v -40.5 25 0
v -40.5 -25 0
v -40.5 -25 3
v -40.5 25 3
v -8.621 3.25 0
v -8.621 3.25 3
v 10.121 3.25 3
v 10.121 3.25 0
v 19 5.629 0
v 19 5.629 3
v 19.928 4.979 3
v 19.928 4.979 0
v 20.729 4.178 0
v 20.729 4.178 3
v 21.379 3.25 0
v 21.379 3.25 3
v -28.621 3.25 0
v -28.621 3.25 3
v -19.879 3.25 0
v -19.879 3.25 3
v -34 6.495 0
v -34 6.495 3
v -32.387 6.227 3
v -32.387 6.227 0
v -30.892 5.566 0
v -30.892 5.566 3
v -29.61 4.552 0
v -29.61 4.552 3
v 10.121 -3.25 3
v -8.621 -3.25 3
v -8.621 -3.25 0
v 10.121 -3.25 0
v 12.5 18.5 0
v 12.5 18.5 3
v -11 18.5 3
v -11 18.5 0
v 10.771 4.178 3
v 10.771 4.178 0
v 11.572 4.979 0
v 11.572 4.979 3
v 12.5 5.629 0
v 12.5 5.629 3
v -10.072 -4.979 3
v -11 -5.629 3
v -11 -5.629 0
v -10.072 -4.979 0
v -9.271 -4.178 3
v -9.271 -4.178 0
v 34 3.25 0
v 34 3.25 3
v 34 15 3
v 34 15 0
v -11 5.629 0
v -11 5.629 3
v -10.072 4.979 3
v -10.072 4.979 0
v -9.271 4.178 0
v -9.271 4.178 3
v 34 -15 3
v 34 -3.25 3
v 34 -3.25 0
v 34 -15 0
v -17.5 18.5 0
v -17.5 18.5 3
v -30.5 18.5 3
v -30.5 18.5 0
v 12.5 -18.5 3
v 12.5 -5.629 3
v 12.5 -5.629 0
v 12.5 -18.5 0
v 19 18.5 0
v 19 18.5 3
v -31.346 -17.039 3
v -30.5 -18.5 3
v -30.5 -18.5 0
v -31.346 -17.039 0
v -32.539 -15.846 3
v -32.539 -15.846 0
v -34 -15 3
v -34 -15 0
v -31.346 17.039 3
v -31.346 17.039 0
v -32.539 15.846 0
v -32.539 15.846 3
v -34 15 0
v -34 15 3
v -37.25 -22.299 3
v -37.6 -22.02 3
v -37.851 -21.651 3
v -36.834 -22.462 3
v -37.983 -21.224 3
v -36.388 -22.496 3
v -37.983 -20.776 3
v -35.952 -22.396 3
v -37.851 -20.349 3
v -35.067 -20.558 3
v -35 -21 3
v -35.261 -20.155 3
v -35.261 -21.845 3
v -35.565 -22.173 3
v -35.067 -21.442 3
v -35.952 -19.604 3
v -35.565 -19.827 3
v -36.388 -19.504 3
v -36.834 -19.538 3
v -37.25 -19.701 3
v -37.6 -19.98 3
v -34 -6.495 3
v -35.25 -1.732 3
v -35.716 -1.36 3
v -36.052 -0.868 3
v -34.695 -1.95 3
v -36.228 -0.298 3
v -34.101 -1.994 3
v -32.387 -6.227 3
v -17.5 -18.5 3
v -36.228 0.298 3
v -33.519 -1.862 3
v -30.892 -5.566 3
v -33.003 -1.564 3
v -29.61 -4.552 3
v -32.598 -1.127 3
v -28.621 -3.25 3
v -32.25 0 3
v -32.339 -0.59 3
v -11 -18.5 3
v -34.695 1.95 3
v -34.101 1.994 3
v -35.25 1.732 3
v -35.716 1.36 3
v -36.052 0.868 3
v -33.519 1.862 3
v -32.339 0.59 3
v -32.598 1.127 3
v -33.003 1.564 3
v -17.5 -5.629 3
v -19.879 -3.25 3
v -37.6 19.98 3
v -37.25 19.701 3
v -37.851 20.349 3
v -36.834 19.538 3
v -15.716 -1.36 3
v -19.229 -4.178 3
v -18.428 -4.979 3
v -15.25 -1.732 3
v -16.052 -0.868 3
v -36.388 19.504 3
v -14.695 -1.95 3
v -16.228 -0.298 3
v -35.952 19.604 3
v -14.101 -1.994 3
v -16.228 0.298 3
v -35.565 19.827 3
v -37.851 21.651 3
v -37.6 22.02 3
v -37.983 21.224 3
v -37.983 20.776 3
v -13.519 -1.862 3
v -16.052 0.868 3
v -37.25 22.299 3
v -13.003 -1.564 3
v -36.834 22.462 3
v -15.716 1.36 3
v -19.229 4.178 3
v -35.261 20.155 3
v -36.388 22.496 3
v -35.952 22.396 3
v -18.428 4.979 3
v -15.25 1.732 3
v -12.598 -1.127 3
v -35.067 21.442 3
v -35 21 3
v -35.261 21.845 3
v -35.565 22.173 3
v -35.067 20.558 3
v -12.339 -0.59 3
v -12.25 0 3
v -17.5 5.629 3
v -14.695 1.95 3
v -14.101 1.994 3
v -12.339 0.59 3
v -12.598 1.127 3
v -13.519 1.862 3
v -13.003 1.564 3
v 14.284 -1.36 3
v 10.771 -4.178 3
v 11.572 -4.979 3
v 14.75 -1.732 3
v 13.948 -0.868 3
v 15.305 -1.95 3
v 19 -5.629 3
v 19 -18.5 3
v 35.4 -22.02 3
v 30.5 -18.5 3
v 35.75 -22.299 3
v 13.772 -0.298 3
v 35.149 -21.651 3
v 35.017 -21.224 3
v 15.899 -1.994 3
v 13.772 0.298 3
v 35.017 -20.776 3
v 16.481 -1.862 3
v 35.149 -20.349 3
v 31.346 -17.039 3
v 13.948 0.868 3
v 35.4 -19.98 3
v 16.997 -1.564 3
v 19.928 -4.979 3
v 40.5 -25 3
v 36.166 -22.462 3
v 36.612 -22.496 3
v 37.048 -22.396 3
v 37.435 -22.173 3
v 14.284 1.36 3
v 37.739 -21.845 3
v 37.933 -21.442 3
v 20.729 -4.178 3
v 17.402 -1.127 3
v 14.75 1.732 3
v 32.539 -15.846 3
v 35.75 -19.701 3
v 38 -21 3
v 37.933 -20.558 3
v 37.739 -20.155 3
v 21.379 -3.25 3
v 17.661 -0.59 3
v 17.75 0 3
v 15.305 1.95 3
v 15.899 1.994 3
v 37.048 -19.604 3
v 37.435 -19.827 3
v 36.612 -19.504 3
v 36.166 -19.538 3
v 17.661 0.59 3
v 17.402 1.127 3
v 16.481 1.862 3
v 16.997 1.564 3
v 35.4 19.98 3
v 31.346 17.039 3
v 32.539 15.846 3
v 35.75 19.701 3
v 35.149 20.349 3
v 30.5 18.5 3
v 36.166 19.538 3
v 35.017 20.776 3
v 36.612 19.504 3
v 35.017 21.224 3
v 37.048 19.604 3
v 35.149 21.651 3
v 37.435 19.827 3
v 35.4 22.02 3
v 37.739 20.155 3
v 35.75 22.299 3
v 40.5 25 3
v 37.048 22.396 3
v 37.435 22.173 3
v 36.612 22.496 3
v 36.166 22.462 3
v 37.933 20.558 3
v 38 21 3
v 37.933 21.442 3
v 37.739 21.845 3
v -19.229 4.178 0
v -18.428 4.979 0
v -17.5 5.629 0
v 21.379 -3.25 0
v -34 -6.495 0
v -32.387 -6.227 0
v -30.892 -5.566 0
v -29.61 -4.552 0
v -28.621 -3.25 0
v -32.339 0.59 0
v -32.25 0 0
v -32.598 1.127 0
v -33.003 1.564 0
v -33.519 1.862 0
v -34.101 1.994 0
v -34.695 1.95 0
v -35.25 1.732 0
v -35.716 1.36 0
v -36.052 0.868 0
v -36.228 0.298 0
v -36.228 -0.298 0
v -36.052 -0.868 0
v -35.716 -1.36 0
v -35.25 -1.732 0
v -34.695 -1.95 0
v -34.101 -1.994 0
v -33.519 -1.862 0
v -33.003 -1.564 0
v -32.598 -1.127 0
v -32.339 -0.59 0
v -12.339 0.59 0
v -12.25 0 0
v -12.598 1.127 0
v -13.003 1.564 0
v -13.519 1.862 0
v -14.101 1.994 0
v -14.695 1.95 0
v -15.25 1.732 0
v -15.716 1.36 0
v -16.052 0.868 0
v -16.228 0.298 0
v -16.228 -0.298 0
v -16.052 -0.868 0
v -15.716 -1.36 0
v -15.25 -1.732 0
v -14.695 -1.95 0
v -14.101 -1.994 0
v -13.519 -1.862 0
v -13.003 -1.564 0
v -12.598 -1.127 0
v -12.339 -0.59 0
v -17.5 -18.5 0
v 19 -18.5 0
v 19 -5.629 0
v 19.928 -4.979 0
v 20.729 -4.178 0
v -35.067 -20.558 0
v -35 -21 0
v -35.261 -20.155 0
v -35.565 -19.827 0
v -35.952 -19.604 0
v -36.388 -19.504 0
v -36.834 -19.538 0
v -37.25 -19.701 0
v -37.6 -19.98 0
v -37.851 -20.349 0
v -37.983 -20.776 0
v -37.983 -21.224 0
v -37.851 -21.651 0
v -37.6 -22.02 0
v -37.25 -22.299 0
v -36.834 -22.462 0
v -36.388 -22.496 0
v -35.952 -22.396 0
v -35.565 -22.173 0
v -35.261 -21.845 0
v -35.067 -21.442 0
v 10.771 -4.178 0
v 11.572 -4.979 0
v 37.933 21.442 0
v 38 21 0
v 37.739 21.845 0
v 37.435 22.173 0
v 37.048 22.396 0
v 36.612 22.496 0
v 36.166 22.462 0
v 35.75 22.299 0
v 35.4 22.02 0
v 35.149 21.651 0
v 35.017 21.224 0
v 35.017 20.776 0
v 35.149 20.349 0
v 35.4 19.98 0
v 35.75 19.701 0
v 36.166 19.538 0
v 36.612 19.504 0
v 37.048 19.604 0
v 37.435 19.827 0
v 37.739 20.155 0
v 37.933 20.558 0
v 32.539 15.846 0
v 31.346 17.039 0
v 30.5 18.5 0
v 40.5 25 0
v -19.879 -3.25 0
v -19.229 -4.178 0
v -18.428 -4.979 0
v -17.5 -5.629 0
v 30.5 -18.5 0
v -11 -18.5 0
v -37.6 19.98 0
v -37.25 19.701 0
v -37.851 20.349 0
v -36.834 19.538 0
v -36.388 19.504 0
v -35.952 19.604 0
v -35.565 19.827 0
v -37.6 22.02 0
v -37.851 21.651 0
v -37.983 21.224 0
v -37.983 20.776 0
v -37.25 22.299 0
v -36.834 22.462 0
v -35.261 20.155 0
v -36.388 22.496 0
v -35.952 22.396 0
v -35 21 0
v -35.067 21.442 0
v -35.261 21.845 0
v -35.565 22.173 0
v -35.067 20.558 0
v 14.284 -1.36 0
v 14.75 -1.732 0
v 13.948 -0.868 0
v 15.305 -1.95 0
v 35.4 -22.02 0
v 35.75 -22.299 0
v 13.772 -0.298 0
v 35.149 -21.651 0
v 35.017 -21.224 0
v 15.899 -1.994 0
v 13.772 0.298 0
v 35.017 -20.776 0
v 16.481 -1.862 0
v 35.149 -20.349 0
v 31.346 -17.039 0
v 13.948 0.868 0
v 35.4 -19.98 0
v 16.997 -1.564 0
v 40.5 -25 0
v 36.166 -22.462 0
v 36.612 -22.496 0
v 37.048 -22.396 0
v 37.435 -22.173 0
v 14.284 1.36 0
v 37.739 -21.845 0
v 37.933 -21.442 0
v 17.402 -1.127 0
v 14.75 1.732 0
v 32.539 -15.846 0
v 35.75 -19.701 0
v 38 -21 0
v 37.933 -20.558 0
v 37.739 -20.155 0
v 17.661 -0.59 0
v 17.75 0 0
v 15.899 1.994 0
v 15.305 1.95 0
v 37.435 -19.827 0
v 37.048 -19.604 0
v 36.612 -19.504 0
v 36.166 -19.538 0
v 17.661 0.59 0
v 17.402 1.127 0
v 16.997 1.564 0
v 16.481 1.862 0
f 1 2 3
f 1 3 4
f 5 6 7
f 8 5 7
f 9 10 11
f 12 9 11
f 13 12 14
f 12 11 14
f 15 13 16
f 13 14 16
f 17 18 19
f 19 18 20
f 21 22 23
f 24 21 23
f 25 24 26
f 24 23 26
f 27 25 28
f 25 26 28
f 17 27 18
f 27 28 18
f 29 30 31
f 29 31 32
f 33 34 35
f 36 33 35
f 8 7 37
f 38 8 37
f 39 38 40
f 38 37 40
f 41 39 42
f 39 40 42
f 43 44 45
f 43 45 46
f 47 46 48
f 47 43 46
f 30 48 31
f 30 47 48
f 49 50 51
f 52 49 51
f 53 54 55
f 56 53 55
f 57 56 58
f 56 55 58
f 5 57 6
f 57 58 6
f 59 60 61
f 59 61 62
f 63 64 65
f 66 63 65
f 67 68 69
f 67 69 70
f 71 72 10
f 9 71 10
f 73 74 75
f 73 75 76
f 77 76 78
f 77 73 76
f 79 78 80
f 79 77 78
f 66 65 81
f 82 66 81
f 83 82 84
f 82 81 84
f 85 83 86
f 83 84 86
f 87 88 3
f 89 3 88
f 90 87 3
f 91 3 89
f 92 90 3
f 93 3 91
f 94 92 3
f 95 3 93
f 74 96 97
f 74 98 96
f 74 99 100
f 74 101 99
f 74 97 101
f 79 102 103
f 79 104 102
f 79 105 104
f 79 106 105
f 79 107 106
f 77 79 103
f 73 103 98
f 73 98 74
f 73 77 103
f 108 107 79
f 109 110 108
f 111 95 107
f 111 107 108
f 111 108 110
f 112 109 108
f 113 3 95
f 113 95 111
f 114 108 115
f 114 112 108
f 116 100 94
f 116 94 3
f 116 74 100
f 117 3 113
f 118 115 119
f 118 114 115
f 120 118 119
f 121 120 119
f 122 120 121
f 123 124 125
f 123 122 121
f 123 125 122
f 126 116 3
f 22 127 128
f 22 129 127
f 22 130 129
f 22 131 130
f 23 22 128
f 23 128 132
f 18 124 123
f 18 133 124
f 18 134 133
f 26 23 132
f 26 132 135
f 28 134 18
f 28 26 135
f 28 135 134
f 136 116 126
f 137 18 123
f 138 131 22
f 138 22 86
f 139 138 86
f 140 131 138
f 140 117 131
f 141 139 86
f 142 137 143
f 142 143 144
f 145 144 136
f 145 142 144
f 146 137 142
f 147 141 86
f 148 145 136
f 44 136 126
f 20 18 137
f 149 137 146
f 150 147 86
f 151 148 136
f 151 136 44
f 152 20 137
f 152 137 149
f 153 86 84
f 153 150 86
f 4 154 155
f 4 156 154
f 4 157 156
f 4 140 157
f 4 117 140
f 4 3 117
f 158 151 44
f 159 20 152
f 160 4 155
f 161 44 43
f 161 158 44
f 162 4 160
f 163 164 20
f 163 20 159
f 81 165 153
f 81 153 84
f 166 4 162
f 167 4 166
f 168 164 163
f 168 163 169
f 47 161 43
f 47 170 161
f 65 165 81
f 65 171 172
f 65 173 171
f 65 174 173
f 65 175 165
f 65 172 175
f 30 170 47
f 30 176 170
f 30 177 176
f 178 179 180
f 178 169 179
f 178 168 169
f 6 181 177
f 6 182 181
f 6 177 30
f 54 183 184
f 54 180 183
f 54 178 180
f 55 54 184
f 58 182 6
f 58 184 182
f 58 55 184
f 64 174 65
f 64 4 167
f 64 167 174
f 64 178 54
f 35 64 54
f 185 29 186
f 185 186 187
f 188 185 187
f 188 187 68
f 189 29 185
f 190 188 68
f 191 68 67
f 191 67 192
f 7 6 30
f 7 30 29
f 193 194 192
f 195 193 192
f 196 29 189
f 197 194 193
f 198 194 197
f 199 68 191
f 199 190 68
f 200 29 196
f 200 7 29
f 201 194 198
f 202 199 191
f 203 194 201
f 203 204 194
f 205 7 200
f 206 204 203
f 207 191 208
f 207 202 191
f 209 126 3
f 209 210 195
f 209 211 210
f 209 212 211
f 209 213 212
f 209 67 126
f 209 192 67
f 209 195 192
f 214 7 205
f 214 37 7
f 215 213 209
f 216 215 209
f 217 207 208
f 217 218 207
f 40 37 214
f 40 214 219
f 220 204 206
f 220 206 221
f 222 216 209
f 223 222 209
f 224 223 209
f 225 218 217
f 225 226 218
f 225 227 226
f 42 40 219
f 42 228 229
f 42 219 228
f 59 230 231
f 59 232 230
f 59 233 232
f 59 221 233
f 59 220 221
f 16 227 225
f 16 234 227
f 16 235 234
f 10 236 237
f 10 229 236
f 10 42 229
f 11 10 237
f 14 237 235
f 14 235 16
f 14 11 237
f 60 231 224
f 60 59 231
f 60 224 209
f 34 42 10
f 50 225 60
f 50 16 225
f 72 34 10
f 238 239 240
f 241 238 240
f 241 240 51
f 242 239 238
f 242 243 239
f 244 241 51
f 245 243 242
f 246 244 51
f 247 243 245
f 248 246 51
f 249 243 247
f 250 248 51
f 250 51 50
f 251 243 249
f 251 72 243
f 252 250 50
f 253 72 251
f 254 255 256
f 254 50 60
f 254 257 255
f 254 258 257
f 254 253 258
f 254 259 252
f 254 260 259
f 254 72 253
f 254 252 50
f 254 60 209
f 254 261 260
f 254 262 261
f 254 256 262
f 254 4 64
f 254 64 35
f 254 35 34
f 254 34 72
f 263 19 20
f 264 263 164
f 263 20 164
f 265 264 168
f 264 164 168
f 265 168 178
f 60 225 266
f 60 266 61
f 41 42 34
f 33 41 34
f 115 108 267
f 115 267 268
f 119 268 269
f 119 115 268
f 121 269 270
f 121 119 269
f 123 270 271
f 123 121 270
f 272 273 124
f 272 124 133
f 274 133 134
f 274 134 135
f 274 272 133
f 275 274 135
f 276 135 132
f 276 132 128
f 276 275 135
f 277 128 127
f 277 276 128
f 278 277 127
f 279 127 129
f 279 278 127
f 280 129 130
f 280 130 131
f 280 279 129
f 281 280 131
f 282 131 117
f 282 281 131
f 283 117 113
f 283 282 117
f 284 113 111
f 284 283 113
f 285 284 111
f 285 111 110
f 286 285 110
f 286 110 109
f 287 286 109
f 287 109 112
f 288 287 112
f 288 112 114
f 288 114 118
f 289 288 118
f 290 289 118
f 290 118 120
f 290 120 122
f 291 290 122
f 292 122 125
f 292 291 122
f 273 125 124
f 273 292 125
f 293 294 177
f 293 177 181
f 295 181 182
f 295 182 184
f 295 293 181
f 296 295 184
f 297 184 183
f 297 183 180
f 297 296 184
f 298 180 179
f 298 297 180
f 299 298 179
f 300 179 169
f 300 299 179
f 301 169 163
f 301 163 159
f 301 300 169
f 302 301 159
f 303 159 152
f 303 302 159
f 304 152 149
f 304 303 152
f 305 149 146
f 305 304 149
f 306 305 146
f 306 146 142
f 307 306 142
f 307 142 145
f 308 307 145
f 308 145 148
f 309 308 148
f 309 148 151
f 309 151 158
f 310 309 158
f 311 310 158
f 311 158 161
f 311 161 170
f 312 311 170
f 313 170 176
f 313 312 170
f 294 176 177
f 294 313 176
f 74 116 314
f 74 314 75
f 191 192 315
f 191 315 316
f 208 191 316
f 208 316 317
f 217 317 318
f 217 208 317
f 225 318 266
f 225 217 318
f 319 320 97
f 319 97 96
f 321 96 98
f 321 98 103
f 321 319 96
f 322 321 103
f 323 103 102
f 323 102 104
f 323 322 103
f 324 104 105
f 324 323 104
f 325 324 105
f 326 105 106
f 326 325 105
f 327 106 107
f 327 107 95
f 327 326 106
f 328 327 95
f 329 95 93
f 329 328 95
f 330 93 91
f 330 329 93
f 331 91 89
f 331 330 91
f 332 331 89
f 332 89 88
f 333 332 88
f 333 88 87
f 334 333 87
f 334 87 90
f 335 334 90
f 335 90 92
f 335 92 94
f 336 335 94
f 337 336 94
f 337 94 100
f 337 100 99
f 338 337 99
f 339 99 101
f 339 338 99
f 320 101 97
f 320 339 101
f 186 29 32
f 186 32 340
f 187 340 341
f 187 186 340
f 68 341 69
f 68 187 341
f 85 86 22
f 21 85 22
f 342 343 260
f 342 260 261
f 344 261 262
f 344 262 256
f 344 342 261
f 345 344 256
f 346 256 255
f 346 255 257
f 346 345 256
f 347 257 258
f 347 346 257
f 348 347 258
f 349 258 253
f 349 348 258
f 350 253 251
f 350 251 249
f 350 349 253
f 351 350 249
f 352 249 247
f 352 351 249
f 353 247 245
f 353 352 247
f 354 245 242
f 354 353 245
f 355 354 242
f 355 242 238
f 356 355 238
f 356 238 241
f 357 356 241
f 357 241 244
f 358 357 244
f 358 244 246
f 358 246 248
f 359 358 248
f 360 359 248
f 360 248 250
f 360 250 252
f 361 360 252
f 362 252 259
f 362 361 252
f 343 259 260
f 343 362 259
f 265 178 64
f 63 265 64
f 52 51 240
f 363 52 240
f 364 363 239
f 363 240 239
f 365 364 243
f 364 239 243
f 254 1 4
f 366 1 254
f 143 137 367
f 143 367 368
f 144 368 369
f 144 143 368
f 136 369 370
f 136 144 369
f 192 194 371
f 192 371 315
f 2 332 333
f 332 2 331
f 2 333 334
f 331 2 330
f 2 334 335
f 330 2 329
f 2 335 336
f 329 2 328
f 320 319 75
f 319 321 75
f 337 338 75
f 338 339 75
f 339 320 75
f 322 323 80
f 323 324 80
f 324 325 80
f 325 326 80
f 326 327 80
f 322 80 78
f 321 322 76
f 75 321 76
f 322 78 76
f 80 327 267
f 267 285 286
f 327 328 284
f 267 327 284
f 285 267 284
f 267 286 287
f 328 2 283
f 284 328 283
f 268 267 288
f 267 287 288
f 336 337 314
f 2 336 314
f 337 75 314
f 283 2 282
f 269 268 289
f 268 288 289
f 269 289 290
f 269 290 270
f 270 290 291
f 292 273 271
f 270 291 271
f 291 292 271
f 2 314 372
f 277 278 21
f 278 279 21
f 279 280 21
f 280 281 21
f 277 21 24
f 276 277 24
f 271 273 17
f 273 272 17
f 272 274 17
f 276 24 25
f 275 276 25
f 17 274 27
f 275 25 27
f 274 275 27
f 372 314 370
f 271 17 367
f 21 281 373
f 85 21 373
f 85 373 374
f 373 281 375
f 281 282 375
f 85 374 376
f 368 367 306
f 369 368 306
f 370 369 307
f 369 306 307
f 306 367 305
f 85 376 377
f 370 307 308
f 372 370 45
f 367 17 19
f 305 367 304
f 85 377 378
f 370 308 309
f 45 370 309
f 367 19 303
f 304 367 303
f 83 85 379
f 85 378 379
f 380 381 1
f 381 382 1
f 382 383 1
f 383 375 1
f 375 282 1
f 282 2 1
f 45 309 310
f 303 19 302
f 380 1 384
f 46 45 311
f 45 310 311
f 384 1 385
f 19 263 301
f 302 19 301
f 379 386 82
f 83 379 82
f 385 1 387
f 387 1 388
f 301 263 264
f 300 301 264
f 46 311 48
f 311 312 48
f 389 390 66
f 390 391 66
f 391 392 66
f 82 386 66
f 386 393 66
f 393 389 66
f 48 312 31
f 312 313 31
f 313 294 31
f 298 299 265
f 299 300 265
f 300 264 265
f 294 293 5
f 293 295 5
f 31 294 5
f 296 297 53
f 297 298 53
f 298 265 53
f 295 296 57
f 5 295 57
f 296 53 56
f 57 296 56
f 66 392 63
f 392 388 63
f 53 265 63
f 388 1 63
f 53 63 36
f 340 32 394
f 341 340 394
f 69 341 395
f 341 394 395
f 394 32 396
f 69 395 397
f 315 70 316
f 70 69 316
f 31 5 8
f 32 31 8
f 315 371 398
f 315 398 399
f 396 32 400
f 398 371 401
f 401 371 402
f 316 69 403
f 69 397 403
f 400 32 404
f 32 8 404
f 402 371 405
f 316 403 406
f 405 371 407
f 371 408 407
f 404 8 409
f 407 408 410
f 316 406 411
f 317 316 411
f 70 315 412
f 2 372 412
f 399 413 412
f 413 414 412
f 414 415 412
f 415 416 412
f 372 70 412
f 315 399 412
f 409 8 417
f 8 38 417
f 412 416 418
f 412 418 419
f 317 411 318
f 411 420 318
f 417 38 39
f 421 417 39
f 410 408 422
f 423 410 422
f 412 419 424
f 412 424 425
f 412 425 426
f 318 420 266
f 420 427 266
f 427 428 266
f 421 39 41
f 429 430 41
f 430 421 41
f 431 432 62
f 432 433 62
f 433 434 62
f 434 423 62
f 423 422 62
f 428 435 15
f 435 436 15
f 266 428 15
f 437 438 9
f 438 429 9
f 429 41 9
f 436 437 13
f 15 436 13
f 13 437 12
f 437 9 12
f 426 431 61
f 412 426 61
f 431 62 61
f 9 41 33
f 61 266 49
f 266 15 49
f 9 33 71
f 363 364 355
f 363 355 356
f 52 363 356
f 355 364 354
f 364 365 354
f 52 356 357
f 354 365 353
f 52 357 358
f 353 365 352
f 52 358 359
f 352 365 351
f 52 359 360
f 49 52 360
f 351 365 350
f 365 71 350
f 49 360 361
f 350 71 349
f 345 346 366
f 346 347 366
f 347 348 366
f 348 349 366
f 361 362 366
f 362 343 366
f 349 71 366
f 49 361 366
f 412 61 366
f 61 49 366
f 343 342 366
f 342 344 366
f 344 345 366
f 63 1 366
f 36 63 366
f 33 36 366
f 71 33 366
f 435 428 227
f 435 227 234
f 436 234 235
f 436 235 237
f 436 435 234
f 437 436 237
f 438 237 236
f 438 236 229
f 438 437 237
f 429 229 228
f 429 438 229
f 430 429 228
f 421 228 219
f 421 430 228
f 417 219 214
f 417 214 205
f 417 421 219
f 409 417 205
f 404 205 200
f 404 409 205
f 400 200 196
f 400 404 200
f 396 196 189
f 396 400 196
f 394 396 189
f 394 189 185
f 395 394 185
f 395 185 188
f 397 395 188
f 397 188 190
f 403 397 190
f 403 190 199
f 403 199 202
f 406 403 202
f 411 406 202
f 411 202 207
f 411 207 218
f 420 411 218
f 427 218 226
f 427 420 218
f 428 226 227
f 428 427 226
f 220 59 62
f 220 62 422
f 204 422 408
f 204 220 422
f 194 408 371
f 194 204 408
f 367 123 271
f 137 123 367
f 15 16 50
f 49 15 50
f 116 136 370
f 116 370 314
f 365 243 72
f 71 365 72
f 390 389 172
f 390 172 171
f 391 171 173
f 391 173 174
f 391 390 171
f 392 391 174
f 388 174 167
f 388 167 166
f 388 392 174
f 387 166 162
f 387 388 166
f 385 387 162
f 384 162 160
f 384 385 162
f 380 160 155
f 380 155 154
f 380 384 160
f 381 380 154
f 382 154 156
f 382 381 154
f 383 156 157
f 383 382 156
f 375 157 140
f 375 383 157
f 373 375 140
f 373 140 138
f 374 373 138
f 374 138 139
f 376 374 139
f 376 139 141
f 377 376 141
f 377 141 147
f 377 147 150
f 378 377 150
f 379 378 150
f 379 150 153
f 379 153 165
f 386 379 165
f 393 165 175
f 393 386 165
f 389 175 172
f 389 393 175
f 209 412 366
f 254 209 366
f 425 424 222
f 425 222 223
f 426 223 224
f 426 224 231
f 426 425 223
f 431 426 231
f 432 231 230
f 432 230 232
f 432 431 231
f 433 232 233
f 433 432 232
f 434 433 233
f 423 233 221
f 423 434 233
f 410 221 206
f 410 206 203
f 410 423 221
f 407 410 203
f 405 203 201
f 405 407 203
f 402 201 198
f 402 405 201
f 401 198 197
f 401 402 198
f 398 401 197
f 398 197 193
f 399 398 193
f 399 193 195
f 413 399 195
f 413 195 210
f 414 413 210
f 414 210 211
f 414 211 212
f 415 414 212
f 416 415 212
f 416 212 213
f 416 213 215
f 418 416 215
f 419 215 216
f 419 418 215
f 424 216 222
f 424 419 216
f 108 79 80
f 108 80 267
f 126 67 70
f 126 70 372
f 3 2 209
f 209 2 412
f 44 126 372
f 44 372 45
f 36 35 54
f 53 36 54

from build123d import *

# Parameters (mm, degrees)
SKETCH1_W           = 81
SKETCH1_H           = 50
SKETCH1_R           = 2
SKETCH1_R_2         = 1.5
BOSS_EXTRUDE1_DEPTH = 3
CUT_EXTRUDE1_DEPTH  = 4


with BuildPart() as part:
    # Sketch1 → Boss-Extrude1 (new body)
    with BuildSketch(Plane.XY):
        Rectangle(SKETCH1_W, SKETCH1_H)
        with Locations((-34.25, 0)):
            Circle(SKETCH1_R, mode=Mode.SUBTRACT)
        with Locations((-14.25, 0)):
            Circle(SKETCH1_R, mode=Mode.SUBTRACT)
        with Locations((15.75, 0)):
            Circle(SKETCH1_R, mode=Mode.SUBTRACT)
        with Locations((-36.5, 21)):
            Circle(SKETCH1_R_2, mode=Mode.SUBTRACT)
        with Locations((36.5, 21)):
            Circle(SKETCH1_R_2, mode=Mode.SUBTRACT)
        with Locations((36.5, -21)):
            Circle(SKETCH1_R_2, mode=Mode.SUBTRACT)
        with Locations((-36.5, -21)):
            Circle(SKETCH1_R_2, mode=Mode.SUBTRACT)
    extrude(amount=BOSS_EXTRUDE1_DEPTH)

    # Sketch3 → Cut-Extrude1 (cut, through all)
    with BuildSketch(Plane.XY.offset(3)):
        with BuildLine():
            Line((30.5, 18.5), (19, 18.5))
            Line((19, 18.5), (19, 5.629165125))
            ThreePointArc((19, 5.629165125), (20.346194078, 4.596194078), (21.379165125, 3.25))
            Line((21.379165125, 3.25), (34, 3.25))
            Line((34, 3.25), (34, 15))
            ThreePointArc((34, 15), (31.903805922, 16.403805922), (30.5, 18.5))
        make_face()
        with BuildLine():
            Line((12.5, 5.629165125), (12.5, 18.5))
            Line((12.5, 18.5), (-11, 18.5))
            Line((-11, 18.5), (-11, 5.629165125))
            ThreePointArc((-11, 5.629165125), (-9.653805922, 4.596194078), (-8.620834875, 3.25))
            Line((-8.620834875, 3.25), (10.120834875, 3.25))
            ThreePointArc((10.120834875, 3.25), (11.153805922, 4.596194078), (12.5, 5.629165125))
        make_face()
        with BuildLine():
            Line((-28.620834875, 3.25), (-19.879165125, 3.25))
            ThreePointArc((-19.879165125, 3.25), (-18.846194078, 4.596194078), (-17.5, 5.629165125))
            Line((-17.5, 5.629165125), (-17.5, 18.5))
            Line((-17.5, 18.5), (-30.5, 18.5))
            ThreePointArc((-30.5, 18.5), (-31.903805922, 16.403805922), (-34, 15))
            Line((-34, 15), (-34, 6.495190528))
            ThreePointArc((-34, 6.495190528), (-30.892328034, 5.565612183), (-28.620834875, 3.25))
        make_face()
    cut_extrude1 = extrude(amount=-CUT_EXTRUDE1_DEPTH, mode=Mode.SUBTRACT)

    # Mirror2: Cut-Extrude1 across plane
    add(cut_extrude1.mirror(Plane.ZX), mode=Mode.SUBTRACT)


solid = part.part
